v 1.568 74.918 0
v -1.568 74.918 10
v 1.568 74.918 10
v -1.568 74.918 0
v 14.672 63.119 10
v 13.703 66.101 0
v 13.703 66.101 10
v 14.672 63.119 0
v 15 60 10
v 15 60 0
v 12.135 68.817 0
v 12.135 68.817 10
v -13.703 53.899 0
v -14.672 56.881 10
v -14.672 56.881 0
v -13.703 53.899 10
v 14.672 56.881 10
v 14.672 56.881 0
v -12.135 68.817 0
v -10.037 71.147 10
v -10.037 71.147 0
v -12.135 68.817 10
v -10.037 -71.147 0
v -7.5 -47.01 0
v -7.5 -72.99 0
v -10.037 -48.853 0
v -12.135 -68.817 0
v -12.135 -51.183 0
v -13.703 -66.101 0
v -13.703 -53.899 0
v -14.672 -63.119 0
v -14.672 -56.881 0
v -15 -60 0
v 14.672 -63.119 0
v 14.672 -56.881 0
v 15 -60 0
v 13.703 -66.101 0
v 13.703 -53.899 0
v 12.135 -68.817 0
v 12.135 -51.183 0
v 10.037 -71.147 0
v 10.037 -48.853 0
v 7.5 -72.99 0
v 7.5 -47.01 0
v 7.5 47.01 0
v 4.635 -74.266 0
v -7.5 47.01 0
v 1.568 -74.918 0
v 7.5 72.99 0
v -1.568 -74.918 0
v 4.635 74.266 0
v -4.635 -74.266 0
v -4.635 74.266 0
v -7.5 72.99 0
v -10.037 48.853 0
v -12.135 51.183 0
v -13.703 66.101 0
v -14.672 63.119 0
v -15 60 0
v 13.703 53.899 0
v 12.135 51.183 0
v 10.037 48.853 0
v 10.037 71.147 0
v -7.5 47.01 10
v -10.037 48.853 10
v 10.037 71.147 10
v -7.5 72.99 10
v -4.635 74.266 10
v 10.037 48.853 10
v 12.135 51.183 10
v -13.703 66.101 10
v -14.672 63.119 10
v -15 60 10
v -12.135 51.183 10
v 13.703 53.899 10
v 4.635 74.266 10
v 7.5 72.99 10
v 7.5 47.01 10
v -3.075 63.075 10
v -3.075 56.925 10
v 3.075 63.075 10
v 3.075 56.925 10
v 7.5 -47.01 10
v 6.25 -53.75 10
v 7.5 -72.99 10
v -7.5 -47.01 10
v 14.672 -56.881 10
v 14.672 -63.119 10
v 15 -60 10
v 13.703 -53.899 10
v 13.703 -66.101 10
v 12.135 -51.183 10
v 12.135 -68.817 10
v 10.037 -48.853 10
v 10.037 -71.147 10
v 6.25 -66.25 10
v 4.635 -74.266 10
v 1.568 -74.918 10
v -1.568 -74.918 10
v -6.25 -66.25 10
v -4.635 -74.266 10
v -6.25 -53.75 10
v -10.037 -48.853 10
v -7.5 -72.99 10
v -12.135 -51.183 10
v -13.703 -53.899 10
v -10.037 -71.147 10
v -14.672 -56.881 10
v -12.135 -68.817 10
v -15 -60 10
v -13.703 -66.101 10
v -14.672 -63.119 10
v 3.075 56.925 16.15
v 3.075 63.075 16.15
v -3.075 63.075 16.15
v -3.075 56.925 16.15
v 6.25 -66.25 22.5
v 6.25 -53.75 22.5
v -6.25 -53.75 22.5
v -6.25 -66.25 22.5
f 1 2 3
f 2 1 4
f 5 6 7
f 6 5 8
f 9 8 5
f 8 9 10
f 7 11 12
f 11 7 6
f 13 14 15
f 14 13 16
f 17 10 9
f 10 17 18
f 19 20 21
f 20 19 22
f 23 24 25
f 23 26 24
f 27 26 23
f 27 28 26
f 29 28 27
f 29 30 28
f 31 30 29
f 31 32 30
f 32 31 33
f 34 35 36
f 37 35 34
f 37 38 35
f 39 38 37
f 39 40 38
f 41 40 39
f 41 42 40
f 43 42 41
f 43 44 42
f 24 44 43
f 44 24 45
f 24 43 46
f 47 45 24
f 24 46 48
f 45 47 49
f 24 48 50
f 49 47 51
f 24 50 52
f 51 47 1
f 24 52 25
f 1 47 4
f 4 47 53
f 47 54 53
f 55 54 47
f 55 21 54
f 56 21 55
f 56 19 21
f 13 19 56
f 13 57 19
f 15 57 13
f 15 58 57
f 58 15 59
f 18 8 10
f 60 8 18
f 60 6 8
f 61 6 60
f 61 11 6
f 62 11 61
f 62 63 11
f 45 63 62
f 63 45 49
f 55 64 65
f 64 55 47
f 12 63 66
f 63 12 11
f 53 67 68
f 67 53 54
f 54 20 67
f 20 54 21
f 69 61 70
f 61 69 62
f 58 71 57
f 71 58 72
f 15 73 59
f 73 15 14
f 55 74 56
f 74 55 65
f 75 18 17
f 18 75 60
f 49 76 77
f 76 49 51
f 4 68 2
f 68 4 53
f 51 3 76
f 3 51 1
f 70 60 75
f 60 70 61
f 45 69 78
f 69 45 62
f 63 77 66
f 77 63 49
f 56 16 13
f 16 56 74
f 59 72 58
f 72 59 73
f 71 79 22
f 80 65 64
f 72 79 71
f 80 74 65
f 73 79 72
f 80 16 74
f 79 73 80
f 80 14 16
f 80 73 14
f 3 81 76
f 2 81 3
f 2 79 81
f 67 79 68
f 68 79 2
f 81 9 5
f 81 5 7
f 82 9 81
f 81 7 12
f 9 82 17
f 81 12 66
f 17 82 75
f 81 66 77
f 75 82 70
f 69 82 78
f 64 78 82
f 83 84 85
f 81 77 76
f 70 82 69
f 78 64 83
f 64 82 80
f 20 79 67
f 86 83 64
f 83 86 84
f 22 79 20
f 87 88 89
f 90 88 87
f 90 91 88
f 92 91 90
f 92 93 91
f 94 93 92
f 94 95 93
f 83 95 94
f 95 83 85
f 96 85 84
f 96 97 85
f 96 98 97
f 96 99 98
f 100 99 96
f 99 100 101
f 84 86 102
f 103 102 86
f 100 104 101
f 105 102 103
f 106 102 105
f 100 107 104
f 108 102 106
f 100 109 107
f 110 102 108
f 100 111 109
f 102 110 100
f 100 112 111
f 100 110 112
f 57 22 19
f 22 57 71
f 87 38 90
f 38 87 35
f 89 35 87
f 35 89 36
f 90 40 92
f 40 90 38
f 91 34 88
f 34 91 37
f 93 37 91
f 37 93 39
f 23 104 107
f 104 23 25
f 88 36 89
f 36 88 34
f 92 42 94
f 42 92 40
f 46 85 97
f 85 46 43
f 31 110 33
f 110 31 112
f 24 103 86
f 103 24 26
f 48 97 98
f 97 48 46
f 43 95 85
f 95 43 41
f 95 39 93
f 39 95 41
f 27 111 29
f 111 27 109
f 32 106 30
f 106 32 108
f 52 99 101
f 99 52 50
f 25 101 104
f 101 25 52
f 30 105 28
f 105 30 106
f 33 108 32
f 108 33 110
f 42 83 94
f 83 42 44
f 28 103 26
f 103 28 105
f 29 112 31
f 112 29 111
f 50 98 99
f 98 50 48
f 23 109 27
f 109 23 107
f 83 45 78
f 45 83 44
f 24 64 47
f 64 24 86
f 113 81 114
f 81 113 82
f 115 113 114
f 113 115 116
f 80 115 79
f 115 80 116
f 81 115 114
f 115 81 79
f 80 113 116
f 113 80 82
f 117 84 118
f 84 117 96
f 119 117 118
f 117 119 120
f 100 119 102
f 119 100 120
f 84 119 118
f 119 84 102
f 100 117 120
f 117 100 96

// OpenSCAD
// [FL_INDEX: keywords="openscad, 3d_parametric, Parametric_socket_wrench, csg_solid" | COT="Parametric OpenSCAD design from 3DCodeverse"]
// Title: Parametric socket wrench

//Socket wrench (customizable)

/* [Drives] */

// size of drive 1
drive1 = 6.35; // [6.35:1/4", 9.525:3/8", 12.7:1/2", 19.05:3/4", 25.4:1"]
// size of drive 2
drive2 = 12.7; // [6.35:1/4", 9.525:3/8", 12.7:1/2", 19.05:3/4", 25.4:1"]
// drive size tolerance (mm)
tolerance = 0.2;

tolDrive1 = drive1 - tolerance;
tolDrive2 = drive2 - tolerance;

/* [Tool] */

// width of tool (mm)
D = 15;
// MARGIN	
M = D/2; 	
// height (thickness) of tool (mm)
H = 10;
// total length of tool (mm)
Ltot = 150; 	

// Length from Center of One Side to Center of Other Side
L = Ltot-2*(D/2+M);
union()
{
	//Jamesdavid's parametric wrench
	difference() {
		union() {
			translate([0,L/2,H/2]) {
				cylinder(r = (D/2+M), h = H,center = true);
			}
			translate([0,-L/2,H/2]) {
				cylinder(r = (D/2+M), h = H,center = true);
			}
			translate([-1*D/2,-L/2,0]) {
				cube([D,L,H], center=false);
			}
		}
	}
	
	//socket drives
	translate([0, L/2, H+(tolDrive1/2)])
	cube(size = tolDrive1, center = true);

	translate([0, -L/2, H+(tolDrive2/2)])
	cube(size = tolDrive2, center = true);
}
